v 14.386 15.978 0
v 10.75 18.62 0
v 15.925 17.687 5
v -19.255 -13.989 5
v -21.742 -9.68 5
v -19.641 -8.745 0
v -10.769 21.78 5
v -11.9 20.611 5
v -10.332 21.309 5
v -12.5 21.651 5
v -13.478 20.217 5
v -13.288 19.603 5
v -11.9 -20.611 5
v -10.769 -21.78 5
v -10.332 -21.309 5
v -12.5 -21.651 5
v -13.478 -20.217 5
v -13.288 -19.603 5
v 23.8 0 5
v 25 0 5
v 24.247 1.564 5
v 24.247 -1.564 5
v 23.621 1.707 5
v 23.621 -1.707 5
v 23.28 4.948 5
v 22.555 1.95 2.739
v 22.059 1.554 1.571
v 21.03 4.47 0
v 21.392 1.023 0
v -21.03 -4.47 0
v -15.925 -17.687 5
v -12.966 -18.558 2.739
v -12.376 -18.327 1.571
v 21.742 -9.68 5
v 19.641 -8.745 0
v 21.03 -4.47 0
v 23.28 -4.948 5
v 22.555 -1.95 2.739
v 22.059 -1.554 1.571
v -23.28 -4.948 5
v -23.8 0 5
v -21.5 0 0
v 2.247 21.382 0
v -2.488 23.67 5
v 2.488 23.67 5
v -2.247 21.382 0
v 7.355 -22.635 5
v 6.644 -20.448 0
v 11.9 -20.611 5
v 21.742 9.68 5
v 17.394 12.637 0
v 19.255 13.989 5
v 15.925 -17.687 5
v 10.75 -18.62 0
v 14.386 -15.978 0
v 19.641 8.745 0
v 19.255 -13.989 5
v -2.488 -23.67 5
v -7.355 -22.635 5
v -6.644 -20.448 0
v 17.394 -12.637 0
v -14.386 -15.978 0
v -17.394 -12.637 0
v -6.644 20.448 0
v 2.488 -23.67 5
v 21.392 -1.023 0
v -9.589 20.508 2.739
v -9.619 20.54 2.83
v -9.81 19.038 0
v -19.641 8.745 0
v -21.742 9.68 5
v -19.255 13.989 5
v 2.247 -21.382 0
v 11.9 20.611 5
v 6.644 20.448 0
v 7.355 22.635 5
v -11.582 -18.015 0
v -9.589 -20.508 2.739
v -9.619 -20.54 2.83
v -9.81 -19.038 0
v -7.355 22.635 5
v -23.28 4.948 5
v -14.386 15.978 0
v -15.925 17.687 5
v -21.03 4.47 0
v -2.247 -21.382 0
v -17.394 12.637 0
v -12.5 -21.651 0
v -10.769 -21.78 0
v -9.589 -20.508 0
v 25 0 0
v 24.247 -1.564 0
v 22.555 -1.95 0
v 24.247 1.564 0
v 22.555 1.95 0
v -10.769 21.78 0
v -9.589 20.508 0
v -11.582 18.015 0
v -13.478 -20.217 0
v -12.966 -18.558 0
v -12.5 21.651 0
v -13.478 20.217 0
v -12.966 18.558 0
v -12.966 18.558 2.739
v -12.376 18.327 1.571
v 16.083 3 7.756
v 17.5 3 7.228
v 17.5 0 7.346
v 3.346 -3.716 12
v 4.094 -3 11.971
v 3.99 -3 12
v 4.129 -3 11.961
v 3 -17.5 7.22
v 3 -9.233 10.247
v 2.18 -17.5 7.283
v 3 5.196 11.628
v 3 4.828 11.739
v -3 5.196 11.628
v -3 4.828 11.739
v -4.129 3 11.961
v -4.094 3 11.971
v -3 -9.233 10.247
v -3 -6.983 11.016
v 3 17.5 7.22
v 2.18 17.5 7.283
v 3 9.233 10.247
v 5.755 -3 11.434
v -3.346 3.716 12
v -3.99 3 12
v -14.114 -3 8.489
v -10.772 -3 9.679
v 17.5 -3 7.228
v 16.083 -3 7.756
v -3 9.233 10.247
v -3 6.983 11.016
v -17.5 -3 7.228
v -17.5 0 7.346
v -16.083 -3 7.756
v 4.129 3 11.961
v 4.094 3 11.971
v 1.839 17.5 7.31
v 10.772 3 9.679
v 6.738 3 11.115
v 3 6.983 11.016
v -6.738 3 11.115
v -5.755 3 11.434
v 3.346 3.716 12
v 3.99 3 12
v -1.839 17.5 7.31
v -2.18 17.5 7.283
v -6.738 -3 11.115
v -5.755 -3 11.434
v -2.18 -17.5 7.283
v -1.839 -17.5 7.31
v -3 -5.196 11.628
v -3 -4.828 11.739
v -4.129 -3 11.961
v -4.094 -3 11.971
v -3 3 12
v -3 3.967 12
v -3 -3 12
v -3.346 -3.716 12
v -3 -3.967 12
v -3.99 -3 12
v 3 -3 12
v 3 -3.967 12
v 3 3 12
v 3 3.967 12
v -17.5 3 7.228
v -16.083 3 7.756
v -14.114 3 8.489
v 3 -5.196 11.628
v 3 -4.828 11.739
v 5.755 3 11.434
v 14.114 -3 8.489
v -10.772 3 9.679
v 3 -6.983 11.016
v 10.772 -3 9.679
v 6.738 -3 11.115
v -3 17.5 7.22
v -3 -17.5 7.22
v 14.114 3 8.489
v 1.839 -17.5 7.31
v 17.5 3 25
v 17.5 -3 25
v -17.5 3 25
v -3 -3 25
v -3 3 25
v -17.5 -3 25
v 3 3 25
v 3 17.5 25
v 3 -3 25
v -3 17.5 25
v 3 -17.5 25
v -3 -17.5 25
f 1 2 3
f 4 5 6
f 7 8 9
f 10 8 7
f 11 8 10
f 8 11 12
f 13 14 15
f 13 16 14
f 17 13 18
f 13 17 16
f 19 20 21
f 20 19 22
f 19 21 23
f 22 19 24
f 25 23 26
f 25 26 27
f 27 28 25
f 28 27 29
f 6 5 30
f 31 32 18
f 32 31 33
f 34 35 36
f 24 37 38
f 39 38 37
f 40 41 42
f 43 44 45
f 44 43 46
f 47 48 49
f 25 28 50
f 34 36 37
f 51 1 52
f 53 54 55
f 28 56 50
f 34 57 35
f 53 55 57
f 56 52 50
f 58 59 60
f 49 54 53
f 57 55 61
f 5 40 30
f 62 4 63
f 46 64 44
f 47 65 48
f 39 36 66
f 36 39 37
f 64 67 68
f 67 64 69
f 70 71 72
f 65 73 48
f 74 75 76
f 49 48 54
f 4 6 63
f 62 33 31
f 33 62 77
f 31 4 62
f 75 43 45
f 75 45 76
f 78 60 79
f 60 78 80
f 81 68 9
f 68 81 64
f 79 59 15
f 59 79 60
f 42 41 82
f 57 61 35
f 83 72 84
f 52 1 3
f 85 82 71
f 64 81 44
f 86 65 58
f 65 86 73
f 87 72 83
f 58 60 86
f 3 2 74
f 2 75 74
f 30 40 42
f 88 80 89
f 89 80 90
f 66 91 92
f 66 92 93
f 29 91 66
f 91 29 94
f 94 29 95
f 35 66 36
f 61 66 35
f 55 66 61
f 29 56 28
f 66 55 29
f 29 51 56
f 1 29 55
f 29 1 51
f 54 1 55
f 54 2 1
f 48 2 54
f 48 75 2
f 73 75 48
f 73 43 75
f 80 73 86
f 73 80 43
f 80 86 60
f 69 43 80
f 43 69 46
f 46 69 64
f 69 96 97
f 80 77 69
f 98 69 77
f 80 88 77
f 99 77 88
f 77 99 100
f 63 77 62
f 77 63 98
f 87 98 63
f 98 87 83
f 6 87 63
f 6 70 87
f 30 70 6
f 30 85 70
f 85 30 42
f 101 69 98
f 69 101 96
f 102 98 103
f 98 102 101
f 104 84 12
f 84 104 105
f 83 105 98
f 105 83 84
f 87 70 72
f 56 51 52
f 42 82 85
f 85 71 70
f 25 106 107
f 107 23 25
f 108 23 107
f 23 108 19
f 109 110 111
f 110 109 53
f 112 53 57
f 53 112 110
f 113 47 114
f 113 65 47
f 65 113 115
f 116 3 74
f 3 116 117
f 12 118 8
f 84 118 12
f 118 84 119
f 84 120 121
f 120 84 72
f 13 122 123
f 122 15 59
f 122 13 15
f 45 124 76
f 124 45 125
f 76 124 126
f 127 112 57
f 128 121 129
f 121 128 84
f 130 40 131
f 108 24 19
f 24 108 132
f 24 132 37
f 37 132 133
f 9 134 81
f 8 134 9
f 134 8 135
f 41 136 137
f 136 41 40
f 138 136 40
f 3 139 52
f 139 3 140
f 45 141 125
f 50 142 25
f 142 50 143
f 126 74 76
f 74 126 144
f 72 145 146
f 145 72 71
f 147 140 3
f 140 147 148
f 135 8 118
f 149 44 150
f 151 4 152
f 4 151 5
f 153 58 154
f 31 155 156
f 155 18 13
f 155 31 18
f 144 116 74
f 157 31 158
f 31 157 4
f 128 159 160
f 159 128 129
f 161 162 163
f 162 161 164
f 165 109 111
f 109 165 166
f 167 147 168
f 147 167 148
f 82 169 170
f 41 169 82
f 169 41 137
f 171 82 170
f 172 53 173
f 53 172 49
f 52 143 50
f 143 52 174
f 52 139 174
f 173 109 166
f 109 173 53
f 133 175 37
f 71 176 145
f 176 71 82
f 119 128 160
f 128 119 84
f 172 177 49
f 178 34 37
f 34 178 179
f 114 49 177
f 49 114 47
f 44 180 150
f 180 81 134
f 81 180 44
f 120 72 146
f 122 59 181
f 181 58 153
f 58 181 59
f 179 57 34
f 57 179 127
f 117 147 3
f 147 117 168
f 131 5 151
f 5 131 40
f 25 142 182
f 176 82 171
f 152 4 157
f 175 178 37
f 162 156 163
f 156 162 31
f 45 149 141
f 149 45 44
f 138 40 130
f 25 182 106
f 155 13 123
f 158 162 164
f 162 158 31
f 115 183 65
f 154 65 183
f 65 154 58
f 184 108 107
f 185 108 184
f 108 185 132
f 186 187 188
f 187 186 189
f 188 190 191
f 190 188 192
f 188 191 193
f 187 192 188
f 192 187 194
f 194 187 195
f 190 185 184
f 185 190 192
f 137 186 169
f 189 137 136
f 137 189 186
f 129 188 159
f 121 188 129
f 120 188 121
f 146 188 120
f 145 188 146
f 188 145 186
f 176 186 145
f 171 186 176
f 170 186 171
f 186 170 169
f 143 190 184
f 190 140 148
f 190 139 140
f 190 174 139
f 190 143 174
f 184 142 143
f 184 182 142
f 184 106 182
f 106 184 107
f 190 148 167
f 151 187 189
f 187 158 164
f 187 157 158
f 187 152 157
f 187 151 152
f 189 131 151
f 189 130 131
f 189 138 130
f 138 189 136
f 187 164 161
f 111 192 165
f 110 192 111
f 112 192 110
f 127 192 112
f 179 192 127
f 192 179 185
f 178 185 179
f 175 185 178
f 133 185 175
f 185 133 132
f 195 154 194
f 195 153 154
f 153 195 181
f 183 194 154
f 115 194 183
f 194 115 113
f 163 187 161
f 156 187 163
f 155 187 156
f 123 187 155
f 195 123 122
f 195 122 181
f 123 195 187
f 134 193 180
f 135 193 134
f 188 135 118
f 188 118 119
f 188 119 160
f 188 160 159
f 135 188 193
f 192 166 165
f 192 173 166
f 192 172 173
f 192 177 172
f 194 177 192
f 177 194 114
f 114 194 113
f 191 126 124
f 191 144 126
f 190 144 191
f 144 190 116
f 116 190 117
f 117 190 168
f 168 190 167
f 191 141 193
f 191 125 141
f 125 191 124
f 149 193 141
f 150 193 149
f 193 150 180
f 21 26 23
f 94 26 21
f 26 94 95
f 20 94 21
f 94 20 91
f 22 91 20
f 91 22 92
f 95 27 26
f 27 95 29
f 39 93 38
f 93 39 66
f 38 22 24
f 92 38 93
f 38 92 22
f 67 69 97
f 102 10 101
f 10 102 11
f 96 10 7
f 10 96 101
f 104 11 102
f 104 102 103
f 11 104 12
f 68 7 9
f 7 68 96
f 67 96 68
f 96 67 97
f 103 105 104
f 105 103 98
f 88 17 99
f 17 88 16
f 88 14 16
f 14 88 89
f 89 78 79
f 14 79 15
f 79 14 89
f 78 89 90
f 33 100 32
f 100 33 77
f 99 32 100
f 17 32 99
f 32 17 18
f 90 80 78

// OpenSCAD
module hextool()
{
translate([0,0,0]){cylinder(5,21.5,23.8);};
translate([0,0,5]) {cylinder(7,23.8,5);};
translate([0,0,15]) {cube([35,6,20],true);}
rotate(90){translate([0,0,15]) {cube([35,6,20],true);}}
translate([23,0,0]) {cylinder(5,2,2);}
rotate(120){translate([23,0,0]) {cylinder(5,2,2);}}
rotate(240){translate([23,0,0]) {cylinder(5,2,2);}}
}

hextool();
